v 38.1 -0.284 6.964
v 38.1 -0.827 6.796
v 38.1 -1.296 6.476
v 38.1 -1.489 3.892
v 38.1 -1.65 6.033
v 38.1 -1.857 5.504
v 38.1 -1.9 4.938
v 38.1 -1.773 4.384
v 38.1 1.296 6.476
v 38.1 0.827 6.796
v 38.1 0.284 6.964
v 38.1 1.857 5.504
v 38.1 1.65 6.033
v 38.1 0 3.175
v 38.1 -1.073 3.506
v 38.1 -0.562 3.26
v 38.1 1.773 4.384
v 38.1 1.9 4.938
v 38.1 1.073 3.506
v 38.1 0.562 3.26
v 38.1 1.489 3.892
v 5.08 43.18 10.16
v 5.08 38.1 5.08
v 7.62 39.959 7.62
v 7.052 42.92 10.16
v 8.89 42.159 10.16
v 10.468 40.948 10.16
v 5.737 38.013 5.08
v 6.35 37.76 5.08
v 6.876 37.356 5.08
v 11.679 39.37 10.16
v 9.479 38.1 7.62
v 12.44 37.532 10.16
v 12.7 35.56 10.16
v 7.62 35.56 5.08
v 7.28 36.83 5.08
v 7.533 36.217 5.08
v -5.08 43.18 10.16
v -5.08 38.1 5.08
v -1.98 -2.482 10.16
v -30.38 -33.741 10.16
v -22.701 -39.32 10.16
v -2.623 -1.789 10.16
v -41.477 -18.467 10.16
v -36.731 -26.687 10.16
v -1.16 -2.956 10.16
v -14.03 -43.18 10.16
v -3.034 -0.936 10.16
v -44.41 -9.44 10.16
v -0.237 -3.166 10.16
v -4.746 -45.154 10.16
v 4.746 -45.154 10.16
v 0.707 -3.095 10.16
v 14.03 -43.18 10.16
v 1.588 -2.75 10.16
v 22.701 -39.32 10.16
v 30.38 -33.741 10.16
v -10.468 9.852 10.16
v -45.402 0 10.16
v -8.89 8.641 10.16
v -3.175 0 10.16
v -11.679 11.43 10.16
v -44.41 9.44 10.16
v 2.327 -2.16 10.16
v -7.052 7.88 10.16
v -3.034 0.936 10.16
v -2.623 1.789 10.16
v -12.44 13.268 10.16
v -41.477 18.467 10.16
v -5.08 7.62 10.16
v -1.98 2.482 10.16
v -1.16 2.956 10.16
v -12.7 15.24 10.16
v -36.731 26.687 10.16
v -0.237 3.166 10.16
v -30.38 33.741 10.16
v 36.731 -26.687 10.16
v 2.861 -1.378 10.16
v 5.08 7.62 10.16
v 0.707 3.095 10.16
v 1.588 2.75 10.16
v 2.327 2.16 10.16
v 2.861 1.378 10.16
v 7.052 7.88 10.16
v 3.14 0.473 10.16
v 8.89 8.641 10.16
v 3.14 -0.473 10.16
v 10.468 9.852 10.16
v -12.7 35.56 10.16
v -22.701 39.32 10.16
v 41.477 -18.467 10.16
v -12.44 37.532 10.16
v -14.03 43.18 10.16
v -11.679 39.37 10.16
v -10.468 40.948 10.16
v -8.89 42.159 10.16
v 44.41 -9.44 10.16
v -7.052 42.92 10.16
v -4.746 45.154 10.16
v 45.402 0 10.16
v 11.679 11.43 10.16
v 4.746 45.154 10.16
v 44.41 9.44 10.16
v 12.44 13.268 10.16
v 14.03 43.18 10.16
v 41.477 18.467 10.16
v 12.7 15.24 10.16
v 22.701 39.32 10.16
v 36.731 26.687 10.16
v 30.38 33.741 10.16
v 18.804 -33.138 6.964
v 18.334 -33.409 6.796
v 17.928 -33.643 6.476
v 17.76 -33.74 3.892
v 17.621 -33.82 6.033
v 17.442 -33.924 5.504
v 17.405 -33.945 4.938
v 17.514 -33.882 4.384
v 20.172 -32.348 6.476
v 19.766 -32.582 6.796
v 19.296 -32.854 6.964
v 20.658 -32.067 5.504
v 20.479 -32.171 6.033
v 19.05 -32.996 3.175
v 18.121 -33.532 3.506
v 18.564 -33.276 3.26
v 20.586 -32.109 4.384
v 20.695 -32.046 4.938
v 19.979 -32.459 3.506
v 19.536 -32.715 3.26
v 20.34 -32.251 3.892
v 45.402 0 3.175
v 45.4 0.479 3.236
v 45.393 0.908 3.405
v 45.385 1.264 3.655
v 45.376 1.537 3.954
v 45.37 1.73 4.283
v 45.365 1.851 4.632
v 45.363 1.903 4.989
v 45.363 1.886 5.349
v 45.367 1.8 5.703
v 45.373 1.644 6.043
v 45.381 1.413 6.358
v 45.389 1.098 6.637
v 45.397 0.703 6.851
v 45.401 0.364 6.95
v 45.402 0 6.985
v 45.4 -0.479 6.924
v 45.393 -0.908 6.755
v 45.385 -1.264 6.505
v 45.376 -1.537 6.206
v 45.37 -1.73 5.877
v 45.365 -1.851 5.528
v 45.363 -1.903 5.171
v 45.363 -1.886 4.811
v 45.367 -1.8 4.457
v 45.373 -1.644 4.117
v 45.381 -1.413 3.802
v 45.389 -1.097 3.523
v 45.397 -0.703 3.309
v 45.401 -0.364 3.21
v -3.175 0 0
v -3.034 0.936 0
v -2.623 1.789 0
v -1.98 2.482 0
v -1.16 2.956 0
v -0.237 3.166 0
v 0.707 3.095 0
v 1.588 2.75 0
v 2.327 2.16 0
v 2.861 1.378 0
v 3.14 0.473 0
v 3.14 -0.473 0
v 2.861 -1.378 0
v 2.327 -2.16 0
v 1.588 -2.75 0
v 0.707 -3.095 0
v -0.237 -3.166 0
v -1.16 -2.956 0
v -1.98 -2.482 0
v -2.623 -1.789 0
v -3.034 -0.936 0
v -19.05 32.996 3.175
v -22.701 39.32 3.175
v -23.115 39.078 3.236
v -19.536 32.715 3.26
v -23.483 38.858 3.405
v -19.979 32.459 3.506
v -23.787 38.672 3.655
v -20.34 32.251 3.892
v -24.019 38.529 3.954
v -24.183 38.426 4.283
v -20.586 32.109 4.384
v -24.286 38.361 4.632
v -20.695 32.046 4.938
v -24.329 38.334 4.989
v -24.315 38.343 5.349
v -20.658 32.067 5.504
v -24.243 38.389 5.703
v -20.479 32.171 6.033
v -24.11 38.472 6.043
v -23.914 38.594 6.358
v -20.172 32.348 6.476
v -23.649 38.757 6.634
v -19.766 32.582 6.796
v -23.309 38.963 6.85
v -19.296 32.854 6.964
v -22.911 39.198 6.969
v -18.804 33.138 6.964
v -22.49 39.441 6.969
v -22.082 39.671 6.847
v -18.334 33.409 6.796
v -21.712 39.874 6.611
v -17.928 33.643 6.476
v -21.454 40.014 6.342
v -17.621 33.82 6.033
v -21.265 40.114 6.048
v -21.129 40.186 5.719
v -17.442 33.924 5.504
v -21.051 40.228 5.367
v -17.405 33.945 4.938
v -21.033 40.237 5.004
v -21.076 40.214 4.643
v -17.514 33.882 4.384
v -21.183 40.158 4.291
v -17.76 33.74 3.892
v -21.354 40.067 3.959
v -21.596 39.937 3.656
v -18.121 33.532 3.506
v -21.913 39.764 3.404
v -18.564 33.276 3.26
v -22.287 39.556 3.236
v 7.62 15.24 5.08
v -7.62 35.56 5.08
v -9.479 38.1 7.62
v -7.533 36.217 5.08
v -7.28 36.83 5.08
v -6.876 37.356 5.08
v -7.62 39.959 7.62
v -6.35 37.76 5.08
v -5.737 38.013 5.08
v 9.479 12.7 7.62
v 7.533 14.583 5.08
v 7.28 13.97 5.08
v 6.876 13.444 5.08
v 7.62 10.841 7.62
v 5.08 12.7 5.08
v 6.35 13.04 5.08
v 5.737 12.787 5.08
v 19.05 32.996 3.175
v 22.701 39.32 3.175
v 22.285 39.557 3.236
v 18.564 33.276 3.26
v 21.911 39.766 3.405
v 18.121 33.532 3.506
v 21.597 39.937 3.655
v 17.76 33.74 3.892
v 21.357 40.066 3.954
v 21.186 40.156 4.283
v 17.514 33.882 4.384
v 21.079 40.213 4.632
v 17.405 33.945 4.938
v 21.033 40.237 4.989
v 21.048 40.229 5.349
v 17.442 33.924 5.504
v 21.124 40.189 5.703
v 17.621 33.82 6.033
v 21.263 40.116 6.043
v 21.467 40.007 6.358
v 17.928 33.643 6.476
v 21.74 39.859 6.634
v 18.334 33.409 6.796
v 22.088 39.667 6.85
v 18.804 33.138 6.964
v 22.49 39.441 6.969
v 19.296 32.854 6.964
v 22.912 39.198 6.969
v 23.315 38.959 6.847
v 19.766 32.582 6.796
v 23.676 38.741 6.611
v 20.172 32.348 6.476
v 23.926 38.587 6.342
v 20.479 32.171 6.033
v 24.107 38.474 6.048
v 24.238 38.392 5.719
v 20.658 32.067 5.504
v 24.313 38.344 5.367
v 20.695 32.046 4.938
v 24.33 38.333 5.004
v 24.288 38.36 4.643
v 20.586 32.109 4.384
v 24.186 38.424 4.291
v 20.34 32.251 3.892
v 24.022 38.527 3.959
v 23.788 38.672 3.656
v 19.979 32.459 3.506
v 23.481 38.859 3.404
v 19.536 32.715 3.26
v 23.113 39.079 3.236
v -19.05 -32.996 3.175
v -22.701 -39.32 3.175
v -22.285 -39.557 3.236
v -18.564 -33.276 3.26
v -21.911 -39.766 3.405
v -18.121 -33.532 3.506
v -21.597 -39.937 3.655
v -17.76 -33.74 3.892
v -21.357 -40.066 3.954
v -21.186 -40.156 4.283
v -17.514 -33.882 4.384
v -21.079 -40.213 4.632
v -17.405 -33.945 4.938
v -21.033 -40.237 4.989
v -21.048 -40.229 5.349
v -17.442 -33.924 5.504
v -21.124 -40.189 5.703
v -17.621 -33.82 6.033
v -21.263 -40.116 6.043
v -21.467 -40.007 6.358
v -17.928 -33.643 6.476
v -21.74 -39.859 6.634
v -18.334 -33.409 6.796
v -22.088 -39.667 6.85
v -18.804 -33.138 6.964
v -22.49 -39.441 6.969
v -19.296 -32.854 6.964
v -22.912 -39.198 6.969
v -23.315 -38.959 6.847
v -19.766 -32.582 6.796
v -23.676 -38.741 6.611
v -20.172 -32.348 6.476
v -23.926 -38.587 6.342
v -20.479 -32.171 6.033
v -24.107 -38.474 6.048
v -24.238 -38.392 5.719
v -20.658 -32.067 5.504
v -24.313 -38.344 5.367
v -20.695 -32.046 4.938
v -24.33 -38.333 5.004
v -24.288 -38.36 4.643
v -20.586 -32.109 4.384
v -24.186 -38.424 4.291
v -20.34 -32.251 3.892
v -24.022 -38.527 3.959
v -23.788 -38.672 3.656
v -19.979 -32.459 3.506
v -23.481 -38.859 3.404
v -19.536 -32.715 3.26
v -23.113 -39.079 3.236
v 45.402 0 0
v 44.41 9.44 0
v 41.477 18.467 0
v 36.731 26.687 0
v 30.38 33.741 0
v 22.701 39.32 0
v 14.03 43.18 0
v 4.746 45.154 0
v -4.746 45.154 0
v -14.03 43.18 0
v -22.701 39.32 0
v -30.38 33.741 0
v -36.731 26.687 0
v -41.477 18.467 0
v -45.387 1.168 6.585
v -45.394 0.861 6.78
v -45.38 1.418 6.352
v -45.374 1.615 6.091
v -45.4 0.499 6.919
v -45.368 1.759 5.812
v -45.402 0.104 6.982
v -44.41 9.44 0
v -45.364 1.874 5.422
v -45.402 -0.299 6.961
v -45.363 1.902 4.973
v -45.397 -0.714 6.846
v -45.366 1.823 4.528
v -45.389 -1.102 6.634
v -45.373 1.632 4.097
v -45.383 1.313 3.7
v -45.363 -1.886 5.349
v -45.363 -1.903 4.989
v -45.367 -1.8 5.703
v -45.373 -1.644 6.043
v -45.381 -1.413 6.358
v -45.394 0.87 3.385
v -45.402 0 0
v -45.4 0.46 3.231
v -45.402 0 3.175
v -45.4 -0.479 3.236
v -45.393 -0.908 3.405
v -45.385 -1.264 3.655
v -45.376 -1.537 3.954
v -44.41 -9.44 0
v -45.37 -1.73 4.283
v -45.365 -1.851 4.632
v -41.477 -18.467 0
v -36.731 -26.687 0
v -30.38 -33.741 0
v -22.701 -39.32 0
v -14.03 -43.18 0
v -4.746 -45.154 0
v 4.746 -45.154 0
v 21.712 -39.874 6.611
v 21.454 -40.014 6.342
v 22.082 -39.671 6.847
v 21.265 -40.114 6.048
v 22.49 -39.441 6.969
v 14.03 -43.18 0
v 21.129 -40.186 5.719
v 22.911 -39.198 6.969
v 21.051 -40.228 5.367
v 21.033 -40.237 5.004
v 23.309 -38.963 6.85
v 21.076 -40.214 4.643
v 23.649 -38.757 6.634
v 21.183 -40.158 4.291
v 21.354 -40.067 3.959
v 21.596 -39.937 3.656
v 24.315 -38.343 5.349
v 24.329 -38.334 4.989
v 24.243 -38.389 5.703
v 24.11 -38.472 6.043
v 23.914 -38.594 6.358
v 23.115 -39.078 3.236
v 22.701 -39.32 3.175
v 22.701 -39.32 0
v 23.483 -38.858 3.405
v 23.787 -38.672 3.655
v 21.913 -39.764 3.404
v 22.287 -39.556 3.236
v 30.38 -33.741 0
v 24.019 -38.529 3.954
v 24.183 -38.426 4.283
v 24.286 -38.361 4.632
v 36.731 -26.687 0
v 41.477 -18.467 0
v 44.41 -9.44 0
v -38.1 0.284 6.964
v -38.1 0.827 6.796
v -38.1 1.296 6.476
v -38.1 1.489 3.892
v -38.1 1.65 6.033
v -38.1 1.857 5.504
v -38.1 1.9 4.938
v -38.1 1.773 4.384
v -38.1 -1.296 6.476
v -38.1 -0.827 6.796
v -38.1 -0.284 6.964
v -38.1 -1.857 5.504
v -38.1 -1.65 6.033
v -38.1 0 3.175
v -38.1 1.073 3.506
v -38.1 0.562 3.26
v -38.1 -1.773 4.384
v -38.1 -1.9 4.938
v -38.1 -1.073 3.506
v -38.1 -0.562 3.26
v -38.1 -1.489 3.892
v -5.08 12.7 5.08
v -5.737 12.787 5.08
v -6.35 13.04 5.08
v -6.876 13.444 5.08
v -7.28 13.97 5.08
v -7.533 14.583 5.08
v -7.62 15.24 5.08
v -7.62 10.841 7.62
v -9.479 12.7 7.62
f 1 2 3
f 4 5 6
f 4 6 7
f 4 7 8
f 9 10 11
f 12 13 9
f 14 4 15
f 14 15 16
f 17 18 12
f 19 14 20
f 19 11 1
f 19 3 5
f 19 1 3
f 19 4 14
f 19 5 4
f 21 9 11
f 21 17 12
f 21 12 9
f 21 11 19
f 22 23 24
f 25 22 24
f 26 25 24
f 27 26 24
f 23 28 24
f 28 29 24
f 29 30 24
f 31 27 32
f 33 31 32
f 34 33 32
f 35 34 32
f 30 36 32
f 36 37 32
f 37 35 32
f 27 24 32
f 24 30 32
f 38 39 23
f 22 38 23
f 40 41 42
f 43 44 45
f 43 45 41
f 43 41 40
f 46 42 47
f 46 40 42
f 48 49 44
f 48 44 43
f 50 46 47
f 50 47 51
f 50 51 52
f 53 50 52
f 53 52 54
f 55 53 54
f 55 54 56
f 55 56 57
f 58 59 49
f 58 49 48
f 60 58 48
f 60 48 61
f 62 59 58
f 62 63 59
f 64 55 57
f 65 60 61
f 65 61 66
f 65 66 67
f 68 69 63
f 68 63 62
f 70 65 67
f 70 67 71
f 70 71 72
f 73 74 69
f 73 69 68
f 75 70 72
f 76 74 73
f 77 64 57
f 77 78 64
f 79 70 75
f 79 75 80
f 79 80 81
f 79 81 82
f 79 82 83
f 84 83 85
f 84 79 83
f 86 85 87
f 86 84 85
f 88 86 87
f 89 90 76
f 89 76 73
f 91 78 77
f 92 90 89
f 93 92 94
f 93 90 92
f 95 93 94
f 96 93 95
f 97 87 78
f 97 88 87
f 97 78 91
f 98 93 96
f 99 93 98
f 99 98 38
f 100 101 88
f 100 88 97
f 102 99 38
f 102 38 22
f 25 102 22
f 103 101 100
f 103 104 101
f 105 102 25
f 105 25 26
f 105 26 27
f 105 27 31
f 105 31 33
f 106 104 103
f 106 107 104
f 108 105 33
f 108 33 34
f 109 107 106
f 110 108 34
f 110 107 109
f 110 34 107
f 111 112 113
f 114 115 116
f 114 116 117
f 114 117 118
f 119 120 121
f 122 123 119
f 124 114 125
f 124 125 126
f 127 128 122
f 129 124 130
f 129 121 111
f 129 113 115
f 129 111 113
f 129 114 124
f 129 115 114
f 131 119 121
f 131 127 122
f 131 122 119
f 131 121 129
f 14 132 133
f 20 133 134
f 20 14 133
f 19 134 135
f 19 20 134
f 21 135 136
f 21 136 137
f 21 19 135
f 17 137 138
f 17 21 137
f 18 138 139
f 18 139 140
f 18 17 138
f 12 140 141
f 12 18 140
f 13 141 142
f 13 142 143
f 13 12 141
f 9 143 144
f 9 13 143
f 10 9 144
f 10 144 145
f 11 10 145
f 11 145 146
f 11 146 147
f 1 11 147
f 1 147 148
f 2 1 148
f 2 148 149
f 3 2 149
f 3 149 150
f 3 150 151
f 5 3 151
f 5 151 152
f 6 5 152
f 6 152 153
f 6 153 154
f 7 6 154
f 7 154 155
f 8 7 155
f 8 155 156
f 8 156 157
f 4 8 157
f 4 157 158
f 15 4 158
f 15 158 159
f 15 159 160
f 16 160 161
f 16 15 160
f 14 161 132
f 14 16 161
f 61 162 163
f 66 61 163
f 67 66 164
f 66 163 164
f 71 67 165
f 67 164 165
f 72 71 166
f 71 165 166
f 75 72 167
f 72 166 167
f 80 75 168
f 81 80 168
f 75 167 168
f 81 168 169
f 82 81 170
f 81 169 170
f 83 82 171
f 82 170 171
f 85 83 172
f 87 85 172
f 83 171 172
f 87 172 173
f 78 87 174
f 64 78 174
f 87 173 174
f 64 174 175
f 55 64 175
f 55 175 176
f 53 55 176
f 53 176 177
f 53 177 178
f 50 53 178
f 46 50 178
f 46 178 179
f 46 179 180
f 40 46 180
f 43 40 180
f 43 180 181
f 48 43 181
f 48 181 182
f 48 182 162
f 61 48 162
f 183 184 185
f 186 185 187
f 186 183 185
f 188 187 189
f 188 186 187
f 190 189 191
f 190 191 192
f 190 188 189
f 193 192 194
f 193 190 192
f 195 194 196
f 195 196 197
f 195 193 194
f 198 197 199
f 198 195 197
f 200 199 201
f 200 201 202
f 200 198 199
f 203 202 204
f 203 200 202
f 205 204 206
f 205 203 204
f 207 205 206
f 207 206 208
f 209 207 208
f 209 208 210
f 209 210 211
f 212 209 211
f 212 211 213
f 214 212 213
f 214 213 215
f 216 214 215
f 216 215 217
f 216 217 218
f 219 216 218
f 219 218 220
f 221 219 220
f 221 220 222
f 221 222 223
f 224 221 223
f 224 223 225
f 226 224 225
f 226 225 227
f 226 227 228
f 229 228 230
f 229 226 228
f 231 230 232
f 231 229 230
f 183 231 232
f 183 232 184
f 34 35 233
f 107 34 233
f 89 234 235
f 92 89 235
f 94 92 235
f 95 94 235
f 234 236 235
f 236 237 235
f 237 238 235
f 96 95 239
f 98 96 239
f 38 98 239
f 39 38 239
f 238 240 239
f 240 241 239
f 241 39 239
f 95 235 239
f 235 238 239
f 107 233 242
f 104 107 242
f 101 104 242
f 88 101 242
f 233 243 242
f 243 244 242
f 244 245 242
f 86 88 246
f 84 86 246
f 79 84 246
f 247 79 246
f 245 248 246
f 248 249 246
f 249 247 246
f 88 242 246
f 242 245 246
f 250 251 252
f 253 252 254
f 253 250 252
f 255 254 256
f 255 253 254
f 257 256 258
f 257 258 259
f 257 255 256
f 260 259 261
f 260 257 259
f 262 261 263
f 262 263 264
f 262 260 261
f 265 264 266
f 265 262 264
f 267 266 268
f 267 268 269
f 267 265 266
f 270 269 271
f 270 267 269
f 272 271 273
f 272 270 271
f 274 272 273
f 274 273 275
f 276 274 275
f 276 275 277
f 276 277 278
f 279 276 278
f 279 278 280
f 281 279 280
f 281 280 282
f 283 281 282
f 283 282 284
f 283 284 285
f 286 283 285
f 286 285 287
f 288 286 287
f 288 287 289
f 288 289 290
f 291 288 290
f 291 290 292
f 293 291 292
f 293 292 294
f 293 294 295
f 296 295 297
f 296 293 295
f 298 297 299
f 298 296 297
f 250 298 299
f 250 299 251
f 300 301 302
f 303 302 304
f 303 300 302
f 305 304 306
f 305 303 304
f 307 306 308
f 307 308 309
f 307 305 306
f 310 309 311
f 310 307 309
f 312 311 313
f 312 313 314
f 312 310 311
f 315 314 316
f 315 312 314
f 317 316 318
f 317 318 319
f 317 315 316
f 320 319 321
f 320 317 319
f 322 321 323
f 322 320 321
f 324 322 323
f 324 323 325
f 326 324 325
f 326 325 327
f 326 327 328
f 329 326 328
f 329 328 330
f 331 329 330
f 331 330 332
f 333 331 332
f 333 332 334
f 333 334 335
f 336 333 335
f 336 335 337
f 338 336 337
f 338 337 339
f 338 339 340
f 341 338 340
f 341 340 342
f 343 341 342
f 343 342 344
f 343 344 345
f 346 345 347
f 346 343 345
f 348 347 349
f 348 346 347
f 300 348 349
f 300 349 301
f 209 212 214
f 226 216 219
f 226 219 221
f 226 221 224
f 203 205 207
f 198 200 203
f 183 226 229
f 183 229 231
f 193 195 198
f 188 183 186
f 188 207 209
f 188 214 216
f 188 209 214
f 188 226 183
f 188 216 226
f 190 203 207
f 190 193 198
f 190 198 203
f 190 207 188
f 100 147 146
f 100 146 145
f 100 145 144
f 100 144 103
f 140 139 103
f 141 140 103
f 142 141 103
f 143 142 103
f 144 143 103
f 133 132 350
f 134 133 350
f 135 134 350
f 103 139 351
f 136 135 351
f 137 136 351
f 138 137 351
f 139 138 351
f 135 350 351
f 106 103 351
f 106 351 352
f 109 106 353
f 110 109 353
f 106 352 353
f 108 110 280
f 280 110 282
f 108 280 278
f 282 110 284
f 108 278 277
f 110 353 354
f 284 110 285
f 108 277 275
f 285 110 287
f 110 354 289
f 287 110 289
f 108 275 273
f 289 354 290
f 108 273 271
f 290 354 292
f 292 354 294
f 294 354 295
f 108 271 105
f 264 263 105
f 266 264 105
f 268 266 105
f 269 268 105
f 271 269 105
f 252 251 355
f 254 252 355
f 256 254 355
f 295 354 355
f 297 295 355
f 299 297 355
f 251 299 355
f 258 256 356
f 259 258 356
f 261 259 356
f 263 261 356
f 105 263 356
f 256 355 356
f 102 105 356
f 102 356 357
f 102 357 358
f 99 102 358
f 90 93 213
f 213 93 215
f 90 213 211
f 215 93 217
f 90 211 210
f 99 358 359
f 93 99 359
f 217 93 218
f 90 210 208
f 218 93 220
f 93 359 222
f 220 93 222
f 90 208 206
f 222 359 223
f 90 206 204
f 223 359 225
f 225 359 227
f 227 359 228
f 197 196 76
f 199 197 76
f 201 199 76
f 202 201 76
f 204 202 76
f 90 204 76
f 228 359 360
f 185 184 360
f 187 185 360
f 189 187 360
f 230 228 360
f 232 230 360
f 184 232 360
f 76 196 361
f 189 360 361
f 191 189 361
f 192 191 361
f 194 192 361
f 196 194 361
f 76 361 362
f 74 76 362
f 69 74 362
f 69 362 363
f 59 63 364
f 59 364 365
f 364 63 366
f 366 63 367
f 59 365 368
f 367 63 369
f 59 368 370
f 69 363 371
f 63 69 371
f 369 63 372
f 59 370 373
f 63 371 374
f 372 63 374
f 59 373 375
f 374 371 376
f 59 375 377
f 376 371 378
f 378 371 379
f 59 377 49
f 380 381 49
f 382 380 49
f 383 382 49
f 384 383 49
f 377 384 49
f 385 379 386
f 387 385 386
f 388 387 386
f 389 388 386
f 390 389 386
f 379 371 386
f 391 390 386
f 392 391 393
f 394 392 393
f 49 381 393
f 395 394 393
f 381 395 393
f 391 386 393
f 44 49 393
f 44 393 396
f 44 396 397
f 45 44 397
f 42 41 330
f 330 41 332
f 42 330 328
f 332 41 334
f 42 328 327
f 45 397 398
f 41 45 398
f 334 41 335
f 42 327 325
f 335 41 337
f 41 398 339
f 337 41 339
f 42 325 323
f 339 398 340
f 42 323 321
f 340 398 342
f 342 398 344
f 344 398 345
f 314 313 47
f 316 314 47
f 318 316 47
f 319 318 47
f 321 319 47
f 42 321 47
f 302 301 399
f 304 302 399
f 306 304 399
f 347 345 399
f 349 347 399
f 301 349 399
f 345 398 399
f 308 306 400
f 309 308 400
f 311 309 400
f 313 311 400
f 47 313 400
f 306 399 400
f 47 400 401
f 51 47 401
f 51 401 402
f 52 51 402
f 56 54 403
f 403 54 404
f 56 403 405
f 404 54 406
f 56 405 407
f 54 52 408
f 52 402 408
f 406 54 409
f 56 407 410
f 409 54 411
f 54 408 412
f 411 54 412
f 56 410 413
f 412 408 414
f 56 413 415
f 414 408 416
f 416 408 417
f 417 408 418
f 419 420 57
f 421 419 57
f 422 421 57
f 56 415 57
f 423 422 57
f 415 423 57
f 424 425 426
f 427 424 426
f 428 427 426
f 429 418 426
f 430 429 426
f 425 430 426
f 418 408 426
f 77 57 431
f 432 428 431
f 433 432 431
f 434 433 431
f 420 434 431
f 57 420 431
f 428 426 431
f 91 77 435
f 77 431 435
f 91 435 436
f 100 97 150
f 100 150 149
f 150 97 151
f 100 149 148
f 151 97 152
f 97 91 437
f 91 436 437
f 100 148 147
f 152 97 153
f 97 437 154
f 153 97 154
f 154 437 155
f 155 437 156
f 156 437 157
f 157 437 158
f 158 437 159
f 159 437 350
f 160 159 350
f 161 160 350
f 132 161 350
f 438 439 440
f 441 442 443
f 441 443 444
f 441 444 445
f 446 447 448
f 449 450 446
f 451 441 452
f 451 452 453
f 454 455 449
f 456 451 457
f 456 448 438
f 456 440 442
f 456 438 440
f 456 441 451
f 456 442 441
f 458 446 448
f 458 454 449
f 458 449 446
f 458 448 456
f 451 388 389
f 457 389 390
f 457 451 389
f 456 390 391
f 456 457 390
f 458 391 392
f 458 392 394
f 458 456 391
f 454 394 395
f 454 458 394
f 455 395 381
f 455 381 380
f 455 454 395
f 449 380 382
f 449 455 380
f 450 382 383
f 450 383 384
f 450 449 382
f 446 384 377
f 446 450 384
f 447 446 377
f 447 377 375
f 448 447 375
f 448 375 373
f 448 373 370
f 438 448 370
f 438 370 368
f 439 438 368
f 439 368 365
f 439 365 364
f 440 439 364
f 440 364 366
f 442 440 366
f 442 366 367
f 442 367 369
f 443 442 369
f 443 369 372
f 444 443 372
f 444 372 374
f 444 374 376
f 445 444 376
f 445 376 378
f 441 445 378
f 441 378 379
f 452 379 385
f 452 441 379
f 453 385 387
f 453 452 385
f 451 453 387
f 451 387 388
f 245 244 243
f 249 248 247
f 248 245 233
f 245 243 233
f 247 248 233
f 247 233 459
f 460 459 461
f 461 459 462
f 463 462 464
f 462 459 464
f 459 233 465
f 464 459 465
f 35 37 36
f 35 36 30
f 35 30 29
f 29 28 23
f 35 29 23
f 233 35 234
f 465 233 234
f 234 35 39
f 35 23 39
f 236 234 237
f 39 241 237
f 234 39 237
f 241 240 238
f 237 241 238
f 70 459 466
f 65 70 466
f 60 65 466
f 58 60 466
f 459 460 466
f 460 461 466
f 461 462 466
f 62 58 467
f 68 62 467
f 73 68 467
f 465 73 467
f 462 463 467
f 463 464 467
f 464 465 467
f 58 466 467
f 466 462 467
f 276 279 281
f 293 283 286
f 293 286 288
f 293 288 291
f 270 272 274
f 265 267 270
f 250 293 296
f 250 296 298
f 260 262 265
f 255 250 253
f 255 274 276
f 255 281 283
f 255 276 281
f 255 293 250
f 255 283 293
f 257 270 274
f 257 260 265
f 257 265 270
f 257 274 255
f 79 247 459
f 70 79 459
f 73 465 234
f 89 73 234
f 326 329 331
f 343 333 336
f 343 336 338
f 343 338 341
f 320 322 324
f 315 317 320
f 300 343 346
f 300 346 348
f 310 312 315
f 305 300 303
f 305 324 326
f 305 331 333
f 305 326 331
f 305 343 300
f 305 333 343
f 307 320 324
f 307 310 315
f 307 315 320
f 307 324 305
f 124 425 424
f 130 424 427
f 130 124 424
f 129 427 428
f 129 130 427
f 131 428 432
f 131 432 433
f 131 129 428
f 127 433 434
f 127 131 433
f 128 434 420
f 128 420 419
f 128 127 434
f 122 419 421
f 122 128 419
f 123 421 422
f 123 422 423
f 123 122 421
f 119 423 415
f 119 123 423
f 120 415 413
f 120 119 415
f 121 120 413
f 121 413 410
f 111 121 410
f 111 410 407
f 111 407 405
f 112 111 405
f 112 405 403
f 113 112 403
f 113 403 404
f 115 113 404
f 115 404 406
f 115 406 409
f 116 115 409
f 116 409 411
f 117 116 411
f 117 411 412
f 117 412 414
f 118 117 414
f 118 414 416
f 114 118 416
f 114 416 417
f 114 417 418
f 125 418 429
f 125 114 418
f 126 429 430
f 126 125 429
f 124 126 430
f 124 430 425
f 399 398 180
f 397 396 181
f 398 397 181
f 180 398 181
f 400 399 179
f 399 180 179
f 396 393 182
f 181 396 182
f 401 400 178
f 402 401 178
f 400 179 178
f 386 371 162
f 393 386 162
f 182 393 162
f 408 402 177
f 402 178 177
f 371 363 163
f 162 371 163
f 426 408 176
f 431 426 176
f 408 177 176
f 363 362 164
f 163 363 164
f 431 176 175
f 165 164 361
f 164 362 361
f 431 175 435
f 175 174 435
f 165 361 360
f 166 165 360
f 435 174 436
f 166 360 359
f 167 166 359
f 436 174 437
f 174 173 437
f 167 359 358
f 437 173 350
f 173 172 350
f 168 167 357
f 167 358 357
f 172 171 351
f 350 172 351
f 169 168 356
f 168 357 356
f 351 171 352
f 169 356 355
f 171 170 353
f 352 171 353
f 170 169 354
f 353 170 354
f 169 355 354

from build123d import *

# Parameters (mm, degrees)
SKETCH1_R           = 45.4025
BOSS_EXTRUDE1_DEPTH = 10.16
CUT_EXTRUDE1_START  = 38.1
SKETCH2_R           = 1.905
CUT_EXTRUDE1_DEPTH  = 7.62
CIRPATTERN1_COUNT   = 6
SKETCH3_R           = 3.175
CUT_EXTRUDE2_DEPTH  = 66.007689034
CUT_EXTRUDE3_DEPTH  = 5.08
CHAMFER2_SIZE       = 5.08


with BuildPart() as part:
    # Sketch1 → Boss-Extrude1 (new body)
    with BuildSketch(Plane.XY):
        Circle(SKETCH1_R)
    extrude(amount=BOSS_EXTRUDE1_DEPTH)

    # Sketch2 → Cut-Extrude1 (cut)
    with BuildSketch(Plane(origin=(0, 0, 0), x_dir=(0, 0, -1), z_dir=(1, 0, 0)).offset(CUT_EXTRUDE1_START)):
        with Locations((-5.08, 0)):
            Circle(SKETCH2_R)
    cut_extrude1 = extrude(amount=CUT_EXTRUDE1_DEPTH, mode=Mode.SUBTRACT)

    # CirPattern1: Cut-Extrude1 ×6 about axis
    cirpattern1_axis = Axis((0, 0, 0), (0, 0, 1))
    for i in range(1, CIRPATTERN1_COUNT):
        add(cut_extrude1.rotate(cirpattern1_axis, i * 360 / CIRPATTERN1_COUNT), mode=Mode.SUBTRACT)

    # Sketch3 → Cut-Extrude2 (cut, through all)
    with BuildSketch(Plane(origin=(0, 0, 0), x_dir=(-1, 0, 0), z_dir=(0, 0, -1))):
        Circle(SKETCH3_R)
    extrude(amount=-CUT_EXTRUDE2_DEPTH, mode=Mode.SUBTRACT)

    # Sketch4 → Cut-Extrude3 (cut)
    with BuildSketch(Plane.XY.offset(10.16)):
        with BuildLine():
            Line((-5.08, 38.1), (5.08, 38.1))
            ThreePointArc((5.08, 38.1), (6.876051224, 37.356051224), (7.62, 35.56))
            Line((7.62, 35.56), (7.62, 15.24))
            ThreePointArc((7.62, 15.24), (6.876051224, 13.443948776), (5.08, 12.7))
            Line((5.08, 12.7), (-5.08, 12.7))
            ThreePointArc((-5.08, 12.7), (-6.876051224, 13.443948776), (-7.62, 15.24))
            Line((-7.62, 15.24), (-7.62, 35.56))
            ThreePointArc((-7.62, 35.56), (-6.876051224, 37.356051224), (-5.08, 38.1))
        make_face()
    extrude(amount=-CUT_EXTRUDE3_DEPTH, mode=Mode.SUBTRACT)

    # Chamfer2
    chamfer2_edges = [part.edges().sort_by_distance(p)[0] for p in [
        (0, 12.7, 10.16),
        (6.876051224, 13.443948776, 10.16),
        (-6.876051224, 13.443948776, 10.16),
        (7.62, 25.4, 10.16),
        (-7.62, 25.4, 10.16),
        (6.876051224, 37.356051224, 10.16),
        (-6.876051224, 37.356051224, 10.16),
        (0, 38.1, 10.16),
    ]]
    chamfer(chamfer2_edges, length=CHAMFER2_SIZE - 0.0001)  # a hair under: the kernel refuses the full size


solid = part.part
